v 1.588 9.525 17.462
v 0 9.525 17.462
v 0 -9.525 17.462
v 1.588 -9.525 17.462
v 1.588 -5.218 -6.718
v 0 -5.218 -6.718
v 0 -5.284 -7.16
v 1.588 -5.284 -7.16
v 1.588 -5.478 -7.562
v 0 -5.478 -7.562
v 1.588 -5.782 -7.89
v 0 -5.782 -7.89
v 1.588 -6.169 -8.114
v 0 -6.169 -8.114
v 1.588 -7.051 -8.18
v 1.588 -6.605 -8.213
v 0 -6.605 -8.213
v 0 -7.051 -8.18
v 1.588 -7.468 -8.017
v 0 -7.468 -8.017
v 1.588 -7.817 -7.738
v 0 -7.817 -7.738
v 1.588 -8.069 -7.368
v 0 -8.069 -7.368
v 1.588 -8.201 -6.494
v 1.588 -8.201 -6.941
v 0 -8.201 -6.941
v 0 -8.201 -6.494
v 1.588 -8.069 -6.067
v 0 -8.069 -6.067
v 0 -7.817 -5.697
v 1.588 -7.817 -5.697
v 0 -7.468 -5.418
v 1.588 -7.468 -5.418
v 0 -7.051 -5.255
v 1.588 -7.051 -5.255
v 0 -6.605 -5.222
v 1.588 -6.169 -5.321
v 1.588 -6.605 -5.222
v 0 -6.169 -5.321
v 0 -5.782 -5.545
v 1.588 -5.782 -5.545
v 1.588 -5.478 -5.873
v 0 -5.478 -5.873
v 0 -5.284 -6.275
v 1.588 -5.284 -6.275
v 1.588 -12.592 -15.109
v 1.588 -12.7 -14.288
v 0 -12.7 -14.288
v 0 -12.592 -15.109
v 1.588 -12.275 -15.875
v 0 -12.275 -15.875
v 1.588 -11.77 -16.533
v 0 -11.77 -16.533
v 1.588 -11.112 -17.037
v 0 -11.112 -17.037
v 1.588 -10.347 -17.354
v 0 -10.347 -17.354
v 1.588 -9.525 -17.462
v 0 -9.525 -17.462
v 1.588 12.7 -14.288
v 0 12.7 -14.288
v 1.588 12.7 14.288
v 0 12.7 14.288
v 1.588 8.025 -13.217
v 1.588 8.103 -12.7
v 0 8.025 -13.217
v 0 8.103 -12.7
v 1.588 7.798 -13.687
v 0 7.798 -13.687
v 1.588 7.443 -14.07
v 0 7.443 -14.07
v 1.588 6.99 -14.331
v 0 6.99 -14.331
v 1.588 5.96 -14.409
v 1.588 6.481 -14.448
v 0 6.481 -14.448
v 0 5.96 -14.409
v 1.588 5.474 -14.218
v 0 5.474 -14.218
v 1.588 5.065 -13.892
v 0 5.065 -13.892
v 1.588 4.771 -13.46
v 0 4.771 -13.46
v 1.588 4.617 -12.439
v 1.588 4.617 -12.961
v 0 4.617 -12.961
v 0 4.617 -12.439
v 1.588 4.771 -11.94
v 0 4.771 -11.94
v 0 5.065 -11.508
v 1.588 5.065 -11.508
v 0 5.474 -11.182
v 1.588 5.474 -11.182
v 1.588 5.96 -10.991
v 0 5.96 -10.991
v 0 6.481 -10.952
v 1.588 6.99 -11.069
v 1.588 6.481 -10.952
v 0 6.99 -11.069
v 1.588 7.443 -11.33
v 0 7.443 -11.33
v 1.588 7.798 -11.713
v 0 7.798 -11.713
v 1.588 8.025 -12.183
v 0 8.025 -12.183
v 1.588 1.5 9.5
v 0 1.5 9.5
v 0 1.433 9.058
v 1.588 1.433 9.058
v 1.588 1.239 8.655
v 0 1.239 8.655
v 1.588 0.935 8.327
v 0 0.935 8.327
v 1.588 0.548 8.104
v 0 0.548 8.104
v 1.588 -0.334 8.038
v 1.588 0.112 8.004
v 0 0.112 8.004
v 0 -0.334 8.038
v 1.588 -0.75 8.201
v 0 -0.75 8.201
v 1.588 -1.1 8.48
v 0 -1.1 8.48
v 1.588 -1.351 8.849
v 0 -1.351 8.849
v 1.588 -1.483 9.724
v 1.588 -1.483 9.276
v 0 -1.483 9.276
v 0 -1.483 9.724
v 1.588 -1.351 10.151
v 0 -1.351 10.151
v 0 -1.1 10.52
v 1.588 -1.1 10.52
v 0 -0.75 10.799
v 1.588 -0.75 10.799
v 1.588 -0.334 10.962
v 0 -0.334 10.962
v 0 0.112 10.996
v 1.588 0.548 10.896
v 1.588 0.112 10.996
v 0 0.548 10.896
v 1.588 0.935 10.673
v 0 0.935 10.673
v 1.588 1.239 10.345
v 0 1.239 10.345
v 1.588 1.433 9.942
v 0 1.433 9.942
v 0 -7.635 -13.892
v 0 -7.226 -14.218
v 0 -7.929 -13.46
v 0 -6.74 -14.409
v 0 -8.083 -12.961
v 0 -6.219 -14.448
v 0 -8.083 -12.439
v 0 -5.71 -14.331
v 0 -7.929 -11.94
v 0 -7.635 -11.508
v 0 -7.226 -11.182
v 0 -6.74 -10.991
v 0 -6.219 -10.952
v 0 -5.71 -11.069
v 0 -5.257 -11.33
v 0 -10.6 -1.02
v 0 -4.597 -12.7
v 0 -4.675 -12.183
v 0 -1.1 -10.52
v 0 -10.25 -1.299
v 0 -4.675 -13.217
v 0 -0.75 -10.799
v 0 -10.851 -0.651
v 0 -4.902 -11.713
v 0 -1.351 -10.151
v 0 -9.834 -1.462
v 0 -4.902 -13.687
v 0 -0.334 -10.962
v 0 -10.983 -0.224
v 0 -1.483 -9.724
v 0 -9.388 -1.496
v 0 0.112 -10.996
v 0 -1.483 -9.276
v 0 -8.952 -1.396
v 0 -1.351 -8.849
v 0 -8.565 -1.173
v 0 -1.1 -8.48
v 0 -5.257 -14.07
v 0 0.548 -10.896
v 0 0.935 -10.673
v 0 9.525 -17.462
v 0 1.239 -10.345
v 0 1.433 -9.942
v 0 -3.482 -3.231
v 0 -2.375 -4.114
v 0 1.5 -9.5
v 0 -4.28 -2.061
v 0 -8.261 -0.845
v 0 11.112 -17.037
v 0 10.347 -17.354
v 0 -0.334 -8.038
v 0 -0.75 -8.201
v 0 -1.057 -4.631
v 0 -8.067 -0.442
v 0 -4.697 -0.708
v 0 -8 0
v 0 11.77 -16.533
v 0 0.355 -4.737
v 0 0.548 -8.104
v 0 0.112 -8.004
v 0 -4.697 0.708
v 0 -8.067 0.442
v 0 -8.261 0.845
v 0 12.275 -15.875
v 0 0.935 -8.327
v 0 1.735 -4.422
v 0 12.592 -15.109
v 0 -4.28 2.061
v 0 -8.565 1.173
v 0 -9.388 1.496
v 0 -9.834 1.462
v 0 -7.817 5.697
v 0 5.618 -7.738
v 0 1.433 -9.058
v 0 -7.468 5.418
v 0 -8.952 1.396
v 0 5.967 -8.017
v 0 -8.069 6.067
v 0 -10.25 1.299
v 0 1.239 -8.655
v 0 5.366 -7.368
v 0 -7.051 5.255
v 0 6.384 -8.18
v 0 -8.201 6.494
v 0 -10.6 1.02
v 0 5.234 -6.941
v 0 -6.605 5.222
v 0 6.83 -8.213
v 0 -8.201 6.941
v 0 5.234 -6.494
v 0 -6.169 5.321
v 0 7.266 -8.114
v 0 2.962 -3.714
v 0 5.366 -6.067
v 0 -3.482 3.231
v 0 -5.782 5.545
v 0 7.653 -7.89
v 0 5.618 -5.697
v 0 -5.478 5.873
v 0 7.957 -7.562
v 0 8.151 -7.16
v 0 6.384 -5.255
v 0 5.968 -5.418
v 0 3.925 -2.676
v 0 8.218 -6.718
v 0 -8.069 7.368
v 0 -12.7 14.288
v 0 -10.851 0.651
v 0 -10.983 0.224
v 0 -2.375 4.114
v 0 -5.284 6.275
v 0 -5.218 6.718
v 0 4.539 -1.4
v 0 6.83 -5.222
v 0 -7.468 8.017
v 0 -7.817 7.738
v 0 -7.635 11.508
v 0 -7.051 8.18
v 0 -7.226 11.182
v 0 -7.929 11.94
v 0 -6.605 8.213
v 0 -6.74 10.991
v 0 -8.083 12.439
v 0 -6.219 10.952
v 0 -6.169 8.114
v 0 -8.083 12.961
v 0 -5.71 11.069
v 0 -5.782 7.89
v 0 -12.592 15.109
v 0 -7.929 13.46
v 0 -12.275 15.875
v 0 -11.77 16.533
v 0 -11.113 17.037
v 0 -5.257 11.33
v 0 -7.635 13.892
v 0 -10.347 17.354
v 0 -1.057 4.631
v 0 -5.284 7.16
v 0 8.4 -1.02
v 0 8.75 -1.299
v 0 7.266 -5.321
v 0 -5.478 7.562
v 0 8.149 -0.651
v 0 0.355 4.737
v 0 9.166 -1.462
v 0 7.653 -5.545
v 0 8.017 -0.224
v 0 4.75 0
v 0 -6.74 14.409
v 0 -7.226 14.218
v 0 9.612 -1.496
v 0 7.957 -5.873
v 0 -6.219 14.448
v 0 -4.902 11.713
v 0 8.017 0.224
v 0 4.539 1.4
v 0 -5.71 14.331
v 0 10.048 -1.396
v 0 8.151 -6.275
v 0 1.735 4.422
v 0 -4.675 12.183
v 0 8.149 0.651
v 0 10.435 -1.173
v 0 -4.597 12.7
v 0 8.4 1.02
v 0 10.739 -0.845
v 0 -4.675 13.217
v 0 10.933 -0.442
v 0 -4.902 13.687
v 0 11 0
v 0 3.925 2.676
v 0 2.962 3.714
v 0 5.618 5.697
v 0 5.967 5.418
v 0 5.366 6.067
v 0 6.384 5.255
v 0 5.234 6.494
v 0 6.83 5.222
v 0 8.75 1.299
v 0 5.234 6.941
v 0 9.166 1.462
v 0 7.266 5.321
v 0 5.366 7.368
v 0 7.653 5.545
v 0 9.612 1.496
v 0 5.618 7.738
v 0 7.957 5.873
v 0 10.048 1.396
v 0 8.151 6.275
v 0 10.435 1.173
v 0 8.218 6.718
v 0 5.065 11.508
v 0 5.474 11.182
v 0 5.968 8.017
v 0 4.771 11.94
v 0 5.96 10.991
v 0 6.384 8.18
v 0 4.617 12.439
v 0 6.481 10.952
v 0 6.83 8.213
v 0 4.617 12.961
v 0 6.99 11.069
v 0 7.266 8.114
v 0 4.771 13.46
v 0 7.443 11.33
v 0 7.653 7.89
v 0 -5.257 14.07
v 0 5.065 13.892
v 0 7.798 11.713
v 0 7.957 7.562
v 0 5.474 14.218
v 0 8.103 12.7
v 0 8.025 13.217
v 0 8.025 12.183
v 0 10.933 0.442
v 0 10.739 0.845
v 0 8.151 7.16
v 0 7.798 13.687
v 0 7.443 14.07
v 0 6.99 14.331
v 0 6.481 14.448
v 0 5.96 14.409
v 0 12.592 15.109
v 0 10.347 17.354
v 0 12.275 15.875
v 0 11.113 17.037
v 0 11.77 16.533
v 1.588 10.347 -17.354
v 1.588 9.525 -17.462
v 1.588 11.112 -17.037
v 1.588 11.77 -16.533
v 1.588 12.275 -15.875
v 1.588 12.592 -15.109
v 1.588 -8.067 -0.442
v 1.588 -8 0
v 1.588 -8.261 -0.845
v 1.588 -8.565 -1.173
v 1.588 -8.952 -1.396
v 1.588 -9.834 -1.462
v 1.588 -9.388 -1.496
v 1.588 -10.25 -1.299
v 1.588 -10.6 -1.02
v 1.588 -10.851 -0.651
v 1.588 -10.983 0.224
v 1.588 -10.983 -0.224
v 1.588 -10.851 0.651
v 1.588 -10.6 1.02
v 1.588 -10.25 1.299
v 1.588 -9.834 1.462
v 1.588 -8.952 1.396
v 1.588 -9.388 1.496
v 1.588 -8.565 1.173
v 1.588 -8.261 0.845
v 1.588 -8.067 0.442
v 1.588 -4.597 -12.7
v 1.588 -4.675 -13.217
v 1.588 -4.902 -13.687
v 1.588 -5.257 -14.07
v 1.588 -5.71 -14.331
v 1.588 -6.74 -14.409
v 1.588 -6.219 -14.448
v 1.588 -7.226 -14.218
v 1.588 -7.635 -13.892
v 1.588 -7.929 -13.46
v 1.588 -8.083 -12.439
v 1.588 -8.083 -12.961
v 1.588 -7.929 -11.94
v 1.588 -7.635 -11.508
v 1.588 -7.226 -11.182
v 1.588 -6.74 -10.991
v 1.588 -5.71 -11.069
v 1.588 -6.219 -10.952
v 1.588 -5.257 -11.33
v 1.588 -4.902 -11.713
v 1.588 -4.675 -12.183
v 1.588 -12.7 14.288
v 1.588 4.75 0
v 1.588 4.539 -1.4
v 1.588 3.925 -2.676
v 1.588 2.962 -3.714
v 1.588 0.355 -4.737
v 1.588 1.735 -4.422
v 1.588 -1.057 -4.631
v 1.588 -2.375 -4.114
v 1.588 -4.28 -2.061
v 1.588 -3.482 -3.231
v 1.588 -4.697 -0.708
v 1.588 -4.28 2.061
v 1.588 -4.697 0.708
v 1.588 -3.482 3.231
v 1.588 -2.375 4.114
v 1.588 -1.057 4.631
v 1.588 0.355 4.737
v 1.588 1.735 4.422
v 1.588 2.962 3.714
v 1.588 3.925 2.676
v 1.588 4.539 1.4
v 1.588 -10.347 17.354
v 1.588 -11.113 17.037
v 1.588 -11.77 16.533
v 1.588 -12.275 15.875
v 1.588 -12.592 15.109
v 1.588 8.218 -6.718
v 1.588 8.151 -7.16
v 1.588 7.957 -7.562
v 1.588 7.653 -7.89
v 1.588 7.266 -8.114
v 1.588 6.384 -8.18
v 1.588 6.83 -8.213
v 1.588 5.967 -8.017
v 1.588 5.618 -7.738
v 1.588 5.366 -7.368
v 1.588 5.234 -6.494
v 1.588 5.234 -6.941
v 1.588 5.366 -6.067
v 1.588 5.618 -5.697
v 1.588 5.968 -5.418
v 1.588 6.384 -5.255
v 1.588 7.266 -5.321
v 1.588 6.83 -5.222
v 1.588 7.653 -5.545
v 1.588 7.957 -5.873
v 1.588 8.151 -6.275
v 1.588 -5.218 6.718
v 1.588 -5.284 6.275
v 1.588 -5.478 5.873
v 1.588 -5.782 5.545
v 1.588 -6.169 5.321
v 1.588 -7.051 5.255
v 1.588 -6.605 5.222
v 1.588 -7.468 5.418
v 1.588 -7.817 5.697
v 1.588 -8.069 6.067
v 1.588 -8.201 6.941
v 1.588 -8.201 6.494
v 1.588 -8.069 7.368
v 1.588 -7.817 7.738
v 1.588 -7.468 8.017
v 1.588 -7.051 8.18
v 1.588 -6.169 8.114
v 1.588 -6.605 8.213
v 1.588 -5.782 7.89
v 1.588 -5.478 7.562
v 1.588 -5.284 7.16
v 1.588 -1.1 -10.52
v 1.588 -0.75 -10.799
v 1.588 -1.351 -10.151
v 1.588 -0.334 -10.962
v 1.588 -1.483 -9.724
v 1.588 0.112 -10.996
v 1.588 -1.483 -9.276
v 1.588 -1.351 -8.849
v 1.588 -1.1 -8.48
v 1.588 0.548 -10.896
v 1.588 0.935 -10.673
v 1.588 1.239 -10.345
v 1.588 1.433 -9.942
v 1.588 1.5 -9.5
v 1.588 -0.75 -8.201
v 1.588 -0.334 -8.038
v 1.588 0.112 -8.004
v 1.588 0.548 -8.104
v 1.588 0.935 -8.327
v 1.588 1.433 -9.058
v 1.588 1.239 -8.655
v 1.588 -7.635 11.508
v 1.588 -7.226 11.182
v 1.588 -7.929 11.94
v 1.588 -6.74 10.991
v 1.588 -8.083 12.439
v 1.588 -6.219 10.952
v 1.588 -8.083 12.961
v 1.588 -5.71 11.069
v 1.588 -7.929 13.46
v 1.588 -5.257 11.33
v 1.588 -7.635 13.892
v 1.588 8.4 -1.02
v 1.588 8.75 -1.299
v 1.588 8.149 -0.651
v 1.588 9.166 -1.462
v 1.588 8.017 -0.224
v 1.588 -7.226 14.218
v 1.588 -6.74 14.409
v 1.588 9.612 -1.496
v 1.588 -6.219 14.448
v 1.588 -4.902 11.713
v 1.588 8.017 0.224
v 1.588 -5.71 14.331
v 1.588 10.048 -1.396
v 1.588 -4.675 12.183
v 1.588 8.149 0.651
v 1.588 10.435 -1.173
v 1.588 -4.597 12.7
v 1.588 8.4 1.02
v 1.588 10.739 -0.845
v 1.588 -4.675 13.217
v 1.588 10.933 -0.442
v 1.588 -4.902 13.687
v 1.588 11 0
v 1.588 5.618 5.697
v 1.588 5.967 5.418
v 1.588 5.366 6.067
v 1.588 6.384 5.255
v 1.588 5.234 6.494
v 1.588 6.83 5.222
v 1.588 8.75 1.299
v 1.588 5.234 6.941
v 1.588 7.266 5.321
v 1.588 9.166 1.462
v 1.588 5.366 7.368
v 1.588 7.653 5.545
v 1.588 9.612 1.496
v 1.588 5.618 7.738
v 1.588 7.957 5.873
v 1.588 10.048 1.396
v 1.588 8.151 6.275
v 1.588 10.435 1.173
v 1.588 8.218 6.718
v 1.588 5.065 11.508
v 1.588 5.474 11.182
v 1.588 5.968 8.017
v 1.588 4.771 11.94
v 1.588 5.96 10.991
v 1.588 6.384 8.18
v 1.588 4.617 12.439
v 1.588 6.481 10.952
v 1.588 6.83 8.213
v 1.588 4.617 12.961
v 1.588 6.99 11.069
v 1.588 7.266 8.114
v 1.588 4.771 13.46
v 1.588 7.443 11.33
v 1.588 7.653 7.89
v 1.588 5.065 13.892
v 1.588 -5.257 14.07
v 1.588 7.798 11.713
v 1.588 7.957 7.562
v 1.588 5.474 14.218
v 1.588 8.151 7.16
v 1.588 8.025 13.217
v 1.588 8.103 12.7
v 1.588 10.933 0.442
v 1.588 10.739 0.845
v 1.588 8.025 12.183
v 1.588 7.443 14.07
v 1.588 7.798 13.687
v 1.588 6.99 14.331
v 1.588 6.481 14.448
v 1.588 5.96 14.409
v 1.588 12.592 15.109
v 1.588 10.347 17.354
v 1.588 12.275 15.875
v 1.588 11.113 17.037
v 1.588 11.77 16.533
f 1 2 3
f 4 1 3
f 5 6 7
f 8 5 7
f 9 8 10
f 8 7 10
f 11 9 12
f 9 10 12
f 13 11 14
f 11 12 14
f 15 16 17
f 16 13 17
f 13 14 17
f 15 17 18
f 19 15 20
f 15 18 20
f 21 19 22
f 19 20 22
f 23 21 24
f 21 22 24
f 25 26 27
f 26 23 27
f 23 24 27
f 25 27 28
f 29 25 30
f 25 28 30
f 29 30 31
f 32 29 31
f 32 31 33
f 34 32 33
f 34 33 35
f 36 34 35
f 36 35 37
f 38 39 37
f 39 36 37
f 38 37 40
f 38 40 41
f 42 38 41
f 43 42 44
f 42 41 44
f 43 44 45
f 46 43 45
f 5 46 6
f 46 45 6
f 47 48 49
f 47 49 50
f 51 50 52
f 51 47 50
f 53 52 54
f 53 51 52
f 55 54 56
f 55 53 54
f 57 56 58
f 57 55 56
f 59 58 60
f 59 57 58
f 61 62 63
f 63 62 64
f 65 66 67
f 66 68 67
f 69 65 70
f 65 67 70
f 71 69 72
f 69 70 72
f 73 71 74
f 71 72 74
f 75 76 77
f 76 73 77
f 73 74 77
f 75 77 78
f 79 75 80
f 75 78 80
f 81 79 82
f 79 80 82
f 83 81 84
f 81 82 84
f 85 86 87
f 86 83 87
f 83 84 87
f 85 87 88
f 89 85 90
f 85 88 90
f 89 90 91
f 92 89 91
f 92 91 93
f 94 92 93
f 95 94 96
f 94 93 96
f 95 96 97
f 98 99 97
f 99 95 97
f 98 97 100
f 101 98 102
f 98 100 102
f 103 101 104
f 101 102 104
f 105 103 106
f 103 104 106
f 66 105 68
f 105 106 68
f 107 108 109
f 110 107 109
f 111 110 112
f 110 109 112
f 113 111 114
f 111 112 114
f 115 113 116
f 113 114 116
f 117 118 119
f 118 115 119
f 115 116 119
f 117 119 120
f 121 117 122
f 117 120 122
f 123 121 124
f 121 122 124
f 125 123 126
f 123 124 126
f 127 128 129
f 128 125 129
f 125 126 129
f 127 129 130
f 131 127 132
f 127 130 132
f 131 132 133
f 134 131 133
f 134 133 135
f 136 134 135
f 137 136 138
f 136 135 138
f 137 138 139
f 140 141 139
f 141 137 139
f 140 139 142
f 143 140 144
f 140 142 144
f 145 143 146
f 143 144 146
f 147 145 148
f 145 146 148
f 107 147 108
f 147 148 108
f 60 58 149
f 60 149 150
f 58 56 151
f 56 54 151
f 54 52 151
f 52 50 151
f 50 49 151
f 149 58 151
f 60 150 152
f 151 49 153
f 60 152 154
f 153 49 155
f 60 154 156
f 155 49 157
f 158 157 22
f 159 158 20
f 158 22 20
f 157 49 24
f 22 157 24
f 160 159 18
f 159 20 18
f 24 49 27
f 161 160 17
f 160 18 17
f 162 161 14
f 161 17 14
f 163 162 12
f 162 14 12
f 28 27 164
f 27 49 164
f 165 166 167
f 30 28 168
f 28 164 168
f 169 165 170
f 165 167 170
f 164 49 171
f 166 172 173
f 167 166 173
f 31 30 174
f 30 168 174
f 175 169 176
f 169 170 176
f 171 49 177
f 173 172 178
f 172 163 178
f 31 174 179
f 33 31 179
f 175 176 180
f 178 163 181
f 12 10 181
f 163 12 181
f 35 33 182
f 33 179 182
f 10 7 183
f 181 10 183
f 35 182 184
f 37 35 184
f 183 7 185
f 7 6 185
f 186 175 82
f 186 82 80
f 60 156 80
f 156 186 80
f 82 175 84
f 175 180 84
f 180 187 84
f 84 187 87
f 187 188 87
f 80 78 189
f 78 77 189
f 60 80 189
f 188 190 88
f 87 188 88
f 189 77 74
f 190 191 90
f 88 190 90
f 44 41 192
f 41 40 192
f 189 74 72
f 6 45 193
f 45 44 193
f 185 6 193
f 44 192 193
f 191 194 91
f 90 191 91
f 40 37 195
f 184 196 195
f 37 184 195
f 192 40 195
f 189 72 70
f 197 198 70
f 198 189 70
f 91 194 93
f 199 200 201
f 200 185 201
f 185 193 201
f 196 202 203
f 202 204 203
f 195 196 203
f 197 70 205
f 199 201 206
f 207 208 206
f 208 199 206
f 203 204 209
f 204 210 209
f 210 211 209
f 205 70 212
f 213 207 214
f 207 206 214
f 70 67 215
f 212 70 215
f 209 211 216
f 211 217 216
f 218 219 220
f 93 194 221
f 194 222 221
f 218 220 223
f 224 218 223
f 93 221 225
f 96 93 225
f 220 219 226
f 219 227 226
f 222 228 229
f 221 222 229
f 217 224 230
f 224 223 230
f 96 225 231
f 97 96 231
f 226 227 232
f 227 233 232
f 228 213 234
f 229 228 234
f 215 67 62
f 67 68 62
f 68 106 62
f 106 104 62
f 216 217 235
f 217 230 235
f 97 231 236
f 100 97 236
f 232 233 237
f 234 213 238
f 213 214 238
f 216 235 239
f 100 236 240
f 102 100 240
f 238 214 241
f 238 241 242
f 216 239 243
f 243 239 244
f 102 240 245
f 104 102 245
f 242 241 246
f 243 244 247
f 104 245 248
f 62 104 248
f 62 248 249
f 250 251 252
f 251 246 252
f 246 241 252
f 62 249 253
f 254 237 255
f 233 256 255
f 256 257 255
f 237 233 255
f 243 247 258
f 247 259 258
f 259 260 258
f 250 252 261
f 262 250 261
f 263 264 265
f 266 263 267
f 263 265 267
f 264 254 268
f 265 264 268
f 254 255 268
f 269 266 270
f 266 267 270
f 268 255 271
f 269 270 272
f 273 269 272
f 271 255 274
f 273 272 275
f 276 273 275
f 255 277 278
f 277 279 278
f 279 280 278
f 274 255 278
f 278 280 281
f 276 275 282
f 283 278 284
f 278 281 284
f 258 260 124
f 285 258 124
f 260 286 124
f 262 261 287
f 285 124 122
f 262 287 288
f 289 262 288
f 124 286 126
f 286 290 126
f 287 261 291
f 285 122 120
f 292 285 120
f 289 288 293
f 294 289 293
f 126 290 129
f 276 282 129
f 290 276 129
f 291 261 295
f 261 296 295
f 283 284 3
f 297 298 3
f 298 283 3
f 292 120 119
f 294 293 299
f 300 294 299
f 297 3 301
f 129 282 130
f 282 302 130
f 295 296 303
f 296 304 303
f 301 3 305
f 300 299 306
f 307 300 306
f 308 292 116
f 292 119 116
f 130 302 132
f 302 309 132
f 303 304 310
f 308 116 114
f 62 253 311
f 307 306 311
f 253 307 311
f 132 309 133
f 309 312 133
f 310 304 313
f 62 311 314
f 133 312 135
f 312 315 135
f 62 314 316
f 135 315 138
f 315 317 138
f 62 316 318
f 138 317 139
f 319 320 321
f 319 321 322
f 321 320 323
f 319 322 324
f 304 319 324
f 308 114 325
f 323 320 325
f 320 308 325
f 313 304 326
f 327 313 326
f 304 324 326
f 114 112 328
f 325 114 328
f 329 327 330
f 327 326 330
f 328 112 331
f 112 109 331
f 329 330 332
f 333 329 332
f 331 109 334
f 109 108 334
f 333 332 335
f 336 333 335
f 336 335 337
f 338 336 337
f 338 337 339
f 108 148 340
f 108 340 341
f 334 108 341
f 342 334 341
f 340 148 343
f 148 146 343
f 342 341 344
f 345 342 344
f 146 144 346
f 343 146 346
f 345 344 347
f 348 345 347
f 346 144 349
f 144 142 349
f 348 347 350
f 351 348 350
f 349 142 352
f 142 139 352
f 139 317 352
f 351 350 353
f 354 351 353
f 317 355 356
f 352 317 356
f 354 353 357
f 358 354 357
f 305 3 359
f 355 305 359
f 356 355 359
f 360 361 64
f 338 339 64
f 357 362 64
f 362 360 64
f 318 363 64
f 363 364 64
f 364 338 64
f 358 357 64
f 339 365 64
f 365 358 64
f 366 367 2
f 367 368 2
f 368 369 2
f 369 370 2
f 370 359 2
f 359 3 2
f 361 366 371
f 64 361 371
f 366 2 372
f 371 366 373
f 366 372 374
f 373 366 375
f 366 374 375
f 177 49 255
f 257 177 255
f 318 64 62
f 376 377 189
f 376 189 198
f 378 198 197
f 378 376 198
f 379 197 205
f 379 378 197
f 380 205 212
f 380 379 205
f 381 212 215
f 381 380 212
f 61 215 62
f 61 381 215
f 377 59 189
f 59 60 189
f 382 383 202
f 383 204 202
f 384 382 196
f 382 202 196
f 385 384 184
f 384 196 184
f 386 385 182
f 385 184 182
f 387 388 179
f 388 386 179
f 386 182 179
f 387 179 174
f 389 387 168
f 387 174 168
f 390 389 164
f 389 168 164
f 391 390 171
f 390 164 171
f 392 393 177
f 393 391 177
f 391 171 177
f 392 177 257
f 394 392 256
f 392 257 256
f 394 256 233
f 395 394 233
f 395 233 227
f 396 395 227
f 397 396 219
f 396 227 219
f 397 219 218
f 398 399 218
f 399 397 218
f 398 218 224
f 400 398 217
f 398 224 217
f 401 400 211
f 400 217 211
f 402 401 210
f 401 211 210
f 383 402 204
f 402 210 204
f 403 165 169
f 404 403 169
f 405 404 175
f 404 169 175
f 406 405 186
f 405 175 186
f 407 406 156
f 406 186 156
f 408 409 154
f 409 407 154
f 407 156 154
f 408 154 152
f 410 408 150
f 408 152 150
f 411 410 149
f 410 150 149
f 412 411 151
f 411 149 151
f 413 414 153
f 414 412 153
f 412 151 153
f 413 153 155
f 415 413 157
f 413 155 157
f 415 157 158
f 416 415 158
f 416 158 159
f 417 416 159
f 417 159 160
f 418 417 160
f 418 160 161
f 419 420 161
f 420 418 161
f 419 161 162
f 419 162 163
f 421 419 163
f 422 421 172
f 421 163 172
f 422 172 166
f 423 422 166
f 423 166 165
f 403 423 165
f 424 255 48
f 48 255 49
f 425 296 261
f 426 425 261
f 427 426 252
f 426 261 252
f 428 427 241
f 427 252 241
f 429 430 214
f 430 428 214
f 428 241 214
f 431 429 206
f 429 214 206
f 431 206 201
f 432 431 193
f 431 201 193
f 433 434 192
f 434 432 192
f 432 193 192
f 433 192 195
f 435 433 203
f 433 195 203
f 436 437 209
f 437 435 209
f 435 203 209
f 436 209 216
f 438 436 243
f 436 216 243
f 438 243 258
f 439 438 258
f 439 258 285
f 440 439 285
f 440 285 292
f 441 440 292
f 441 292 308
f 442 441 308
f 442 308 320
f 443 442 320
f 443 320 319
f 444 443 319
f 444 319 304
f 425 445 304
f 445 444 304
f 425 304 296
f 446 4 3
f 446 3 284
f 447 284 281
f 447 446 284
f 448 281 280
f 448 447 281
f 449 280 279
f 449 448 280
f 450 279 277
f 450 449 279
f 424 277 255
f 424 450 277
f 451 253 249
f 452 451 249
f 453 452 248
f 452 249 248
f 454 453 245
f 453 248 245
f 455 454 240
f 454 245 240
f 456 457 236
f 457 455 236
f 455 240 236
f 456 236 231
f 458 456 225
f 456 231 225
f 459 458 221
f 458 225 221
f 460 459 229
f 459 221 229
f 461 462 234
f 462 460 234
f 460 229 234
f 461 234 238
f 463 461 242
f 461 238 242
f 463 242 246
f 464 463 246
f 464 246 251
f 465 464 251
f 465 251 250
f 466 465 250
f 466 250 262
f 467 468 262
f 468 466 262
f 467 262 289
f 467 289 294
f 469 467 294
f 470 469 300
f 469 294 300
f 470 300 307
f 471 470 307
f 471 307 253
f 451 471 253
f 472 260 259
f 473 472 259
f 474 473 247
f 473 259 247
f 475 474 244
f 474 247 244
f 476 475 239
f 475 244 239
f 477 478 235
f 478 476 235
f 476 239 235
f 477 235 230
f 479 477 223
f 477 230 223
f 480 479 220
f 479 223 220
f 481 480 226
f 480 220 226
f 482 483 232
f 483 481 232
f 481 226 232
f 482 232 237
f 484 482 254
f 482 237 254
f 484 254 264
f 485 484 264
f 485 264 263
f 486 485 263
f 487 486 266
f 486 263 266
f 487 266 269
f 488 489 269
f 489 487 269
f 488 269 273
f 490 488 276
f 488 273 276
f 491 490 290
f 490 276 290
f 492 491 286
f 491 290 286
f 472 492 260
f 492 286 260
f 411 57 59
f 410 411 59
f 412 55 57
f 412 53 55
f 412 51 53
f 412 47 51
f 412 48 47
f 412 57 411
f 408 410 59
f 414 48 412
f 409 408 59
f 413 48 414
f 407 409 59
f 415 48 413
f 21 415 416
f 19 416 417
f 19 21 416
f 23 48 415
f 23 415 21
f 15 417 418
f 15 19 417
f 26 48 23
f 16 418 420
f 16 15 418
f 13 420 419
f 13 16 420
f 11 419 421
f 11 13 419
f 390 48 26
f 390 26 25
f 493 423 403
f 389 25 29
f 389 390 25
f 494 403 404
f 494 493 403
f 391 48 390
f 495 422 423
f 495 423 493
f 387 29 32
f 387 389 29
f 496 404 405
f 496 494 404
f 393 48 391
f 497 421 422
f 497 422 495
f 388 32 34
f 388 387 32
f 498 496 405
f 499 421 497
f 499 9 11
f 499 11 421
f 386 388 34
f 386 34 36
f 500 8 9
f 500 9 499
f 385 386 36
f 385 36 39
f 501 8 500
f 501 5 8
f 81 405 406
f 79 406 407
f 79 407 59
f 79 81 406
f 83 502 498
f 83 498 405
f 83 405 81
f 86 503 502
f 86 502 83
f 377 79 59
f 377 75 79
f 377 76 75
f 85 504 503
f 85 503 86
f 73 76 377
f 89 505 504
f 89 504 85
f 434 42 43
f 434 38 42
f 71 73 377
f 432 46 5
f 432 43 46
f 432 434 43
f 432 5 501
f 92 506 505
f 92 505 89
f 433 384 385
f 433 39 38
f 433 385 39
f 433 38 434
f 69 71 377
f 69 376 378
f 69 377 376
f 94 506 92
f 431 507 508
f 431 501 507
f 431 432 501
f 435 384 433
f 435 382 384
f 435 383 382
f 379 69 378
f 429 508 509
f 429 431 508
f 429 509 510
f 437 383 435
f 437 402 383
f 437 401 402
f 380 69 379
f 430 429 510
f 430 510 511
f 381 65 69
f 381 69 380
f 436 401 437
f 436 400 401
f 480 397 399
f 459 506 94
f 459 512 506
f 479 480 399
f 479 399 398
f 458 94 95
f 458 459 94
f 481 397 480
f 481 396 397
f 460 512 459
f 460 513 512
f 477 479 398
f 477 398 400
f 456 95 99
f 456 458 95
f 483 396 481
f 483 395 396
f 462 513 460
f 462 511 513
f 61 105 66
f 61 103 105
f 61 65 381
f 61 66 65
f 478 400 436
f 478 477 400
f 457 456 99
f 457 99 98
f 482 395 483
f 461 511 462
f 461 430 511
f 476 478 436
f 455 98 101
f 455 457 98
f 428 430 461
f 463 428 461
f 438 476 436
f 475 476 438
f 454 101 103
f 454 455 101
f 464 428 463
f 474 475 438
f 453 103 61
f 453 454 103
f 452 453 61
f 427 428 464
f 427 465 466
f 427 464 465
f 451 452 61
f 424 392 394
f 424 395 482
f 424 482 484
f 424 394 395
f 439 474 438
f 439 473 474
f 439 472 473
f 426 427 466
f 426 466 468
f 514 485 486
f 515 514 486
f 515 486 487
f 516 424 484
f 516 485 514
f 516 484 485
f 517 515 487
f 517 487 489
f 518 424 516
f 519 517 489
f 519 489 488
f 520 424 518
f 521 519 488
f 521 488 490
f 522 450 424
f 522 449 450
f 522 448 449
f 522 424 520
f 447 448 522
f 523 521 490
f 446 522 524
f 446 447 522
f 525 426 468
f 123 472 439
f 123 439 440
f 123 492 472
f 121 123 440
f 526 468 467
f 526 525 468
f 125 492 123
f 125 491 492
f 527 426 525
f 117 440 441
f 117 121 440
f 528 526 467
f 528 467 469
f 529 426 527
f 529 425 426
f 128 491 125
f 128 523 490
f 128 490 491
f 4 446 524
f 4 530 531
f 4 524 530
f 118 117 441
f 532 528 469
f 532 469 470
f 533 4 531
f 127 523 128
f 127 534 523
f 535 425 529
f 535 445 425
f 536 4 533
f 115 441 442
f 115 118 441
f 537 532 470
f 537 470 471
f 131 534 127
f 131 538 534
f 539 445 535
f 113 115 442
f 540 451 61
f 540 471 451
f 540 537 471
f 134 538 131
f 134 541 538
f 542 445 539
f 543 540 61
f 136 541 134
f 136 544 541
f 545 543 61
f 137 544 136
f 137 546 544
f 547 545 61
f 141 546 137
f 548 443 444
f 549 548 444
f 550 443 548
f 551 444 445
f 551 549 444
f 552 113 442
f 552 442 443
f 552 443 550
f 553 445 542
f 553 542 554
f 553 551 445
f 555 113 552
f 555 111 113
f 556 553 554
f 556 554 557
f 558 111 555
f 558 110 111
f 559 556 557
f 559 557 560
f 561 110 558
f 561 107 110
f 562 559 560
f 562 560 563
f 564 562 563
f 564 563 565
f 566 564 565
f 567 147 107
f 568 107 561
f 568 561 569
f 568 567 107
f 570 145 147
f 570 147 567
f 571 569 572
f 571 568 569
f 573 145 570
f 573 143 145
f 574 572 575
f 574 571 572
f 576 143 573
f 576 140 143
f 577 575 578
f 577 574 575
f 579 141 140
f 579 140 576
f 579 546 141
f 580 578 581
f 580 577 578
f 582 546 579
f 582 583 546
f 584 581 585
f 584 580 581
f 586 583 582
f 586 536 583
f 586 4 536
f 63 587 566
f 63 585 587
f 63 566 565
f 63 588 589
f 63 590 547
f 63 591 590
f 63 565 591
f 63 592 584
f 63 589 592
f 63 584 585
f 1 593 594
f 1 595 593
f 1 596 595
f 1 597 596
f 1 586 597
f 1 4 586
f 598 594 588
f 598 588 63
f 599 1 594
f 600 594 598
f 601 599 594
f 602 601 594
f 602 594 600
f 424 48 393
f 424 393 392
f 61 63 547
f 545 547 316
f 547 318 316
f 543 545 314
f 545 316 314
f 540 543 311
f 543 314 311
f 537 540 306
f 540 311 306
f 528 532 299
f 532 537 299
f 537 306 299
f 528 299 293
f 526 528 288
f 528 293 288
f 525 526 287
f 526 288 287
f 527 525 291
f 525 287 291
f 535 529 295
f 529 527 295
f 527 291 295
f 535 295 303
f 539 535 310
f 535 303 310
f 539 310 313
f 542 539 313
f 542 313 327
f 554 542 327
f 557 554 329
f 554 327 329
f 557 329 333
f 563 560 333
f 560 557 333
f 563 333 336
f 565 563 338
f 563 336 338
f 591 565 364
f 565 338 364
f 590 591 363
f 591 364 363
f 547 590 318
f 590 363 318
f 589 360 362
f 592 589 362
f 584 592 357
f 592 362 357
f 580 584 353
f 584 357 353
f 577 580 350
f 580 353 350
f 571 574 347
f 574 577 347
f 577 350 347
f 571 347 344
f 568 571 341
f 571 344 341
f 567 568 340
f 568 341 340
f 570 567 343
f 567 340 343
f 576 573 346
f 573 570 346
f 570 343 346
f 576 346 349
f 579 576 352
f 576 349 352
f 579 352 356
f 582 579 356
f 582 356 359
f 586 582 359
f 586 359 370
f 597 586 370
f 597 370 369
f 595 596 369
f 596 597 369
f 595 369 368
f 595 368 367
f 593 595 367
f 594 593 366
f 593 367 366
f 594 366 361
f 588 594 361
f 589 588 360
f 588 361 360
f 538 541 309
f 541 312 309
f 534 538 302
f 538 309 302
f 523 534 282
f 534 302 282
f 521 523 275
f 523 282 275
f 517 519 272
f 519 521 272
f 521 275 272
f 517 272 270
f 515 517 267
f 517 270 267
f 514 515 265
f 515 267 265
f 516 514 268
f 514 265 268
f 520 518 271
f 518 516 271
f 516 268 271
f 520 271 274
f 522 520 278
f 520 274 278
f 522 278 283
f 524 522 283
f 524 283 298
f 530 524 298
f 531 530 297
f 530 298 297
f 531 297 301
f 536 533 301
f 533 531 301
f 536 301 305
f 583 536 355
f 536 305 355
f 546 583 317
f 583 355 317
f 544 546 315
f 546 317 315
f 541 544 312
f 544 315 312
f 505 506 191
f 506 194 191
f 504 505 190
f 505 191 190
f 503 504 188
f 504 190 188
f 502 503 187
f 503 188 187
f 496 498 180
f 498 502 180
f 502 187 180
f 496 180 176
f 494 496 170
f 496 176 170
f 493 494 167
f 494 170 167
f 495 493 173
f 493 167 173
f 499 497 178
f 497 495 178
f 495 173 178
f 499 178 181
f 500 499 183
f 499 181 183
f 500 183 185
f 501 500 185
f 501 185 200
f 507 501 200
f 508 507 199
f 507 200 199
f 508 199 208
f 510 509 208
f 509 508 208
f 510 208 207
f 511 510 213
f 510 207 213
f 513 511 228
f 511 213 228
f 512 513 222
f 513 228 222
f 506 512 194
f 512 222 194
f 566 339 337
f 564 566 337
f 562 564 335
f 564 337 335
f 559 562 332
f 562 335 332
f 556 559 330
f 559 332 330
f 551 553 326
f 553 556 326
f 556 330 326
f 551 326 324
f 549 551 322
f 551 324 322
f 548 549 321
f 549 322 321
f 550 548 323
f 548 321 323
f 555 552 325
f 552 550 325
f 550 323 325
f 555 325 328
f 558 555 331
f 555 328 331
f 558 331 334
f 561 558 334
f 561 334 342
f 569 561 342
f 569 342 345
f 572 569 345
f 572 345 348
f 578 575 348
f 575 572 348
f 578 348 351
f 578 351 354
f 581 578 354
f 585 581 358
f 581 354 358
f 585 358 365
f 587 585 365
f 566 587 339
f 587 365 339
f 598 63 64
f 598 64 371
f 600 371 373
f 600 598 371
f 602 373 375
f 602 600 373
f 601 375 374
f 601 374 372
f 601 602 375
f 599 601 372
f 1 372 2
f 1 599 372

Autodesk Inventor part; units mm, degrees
ref_plane "YZ Plane" through (0, 0, 0) normal (1, 0, 0) x (0, 1, 0)
ref_plane "XZ Plane" through (0, 0, 0) normal (0, 1, 0) x (-1, 0, 0)
ref_plane "XY Plane" through (0, 0, 0) normal (0, 0, 1) x (1, 0, 0)
sketch "Sketch1" plane through (0, 0, 0) normal (1, 0, 0) x (0, 1, 0)
  circle A0 centre (0, 0) radius 4.75
  line L0 (0, 0) -> (0, -12.7) construction
  line L1 (0, -12.7) -> (6.35, -12.7) construction
  circle A1 centre (6.35, -12.7) radius 1.7526
  circle A2 centre (-6.35, -12.7) radius 1.7526
  circle A3 centre (6.35, 12.7) radius 1.7526
  circle A4 centre (-6.35, 12.7) radius 1.7526
  line L2 (12.7, 17.4625) -> (-12.7, 17.4625)
  line L3 (-12.7, 17.4625) -> (-12.7, -17.4625)
  line L4 (-12.7, -17.4625) -> (12.7, -17.4625)
  line L5 (12.7, -17.4625) -> (12.7, 17.4625)
  line L6 (12.7, 17.4625) -> (-12.7, -17.4625) construction
  line L7 (-12.7, 17.4625) -> (12.7, -17.4625) construction
  circle A5 centre (9.5, 0) radius 1.5 construction
  line L8 (0, 0) -> (9.5, 0) construction
  circle A6 centre (0, 0) radius 9.5 construction
  circle A7 centre (6.7175, 6.7175) radius 1.5
  line L9 (6.7175, 6.7175) -> (0, 0) construction
  circle A8 centre (0, 9.5) radius 1.5
  circle A9 centre (-6.7175, 6.7175) radius 1.5
  circle A10 centre (-9.5, 0) radius 1.5
  circle A11 centre (-6.7175, -6.7175) radius 1.5
  circle A12 centre (0, -9.5) radius 1.5
  circle A13 centre (6.7175, -6.7175) radius 1.5
  circle A14 centre (9.5, 0) radius 1.5
  dimension "d0" = 9.5
  dimension "d1" = 12.7
  dimension "d2" = 6.35
  dimension "d3" = 3.5052
  dimension "d6" = 12.7
  dimension "d9" = 25.4
  dimension "d12" = 25.4
  dimension "d13" = 34.925
  dimension "d14" = 3
  dimension "d15" = 9.5
  dimension "d23" = 3
  dimension "d24" = 45
  dimension "d27" = 360
extrude "Extrusion1" add sketch "Sketch1" along normal blind 1.5875
fillet "Fillet1" radius 3.175 4 edges at (0.7937, 12.7, 17.4625) (0.7937, -12.7, 17.4625) (0.7937, 12.7, -17.4625) (0.7937, -12.7, -17.4625)
equation "\"d9\" = 2 * d1"
equation "\"d23\" = d14"
properties part number "Motor Plates" material "Aluminum 6061"
